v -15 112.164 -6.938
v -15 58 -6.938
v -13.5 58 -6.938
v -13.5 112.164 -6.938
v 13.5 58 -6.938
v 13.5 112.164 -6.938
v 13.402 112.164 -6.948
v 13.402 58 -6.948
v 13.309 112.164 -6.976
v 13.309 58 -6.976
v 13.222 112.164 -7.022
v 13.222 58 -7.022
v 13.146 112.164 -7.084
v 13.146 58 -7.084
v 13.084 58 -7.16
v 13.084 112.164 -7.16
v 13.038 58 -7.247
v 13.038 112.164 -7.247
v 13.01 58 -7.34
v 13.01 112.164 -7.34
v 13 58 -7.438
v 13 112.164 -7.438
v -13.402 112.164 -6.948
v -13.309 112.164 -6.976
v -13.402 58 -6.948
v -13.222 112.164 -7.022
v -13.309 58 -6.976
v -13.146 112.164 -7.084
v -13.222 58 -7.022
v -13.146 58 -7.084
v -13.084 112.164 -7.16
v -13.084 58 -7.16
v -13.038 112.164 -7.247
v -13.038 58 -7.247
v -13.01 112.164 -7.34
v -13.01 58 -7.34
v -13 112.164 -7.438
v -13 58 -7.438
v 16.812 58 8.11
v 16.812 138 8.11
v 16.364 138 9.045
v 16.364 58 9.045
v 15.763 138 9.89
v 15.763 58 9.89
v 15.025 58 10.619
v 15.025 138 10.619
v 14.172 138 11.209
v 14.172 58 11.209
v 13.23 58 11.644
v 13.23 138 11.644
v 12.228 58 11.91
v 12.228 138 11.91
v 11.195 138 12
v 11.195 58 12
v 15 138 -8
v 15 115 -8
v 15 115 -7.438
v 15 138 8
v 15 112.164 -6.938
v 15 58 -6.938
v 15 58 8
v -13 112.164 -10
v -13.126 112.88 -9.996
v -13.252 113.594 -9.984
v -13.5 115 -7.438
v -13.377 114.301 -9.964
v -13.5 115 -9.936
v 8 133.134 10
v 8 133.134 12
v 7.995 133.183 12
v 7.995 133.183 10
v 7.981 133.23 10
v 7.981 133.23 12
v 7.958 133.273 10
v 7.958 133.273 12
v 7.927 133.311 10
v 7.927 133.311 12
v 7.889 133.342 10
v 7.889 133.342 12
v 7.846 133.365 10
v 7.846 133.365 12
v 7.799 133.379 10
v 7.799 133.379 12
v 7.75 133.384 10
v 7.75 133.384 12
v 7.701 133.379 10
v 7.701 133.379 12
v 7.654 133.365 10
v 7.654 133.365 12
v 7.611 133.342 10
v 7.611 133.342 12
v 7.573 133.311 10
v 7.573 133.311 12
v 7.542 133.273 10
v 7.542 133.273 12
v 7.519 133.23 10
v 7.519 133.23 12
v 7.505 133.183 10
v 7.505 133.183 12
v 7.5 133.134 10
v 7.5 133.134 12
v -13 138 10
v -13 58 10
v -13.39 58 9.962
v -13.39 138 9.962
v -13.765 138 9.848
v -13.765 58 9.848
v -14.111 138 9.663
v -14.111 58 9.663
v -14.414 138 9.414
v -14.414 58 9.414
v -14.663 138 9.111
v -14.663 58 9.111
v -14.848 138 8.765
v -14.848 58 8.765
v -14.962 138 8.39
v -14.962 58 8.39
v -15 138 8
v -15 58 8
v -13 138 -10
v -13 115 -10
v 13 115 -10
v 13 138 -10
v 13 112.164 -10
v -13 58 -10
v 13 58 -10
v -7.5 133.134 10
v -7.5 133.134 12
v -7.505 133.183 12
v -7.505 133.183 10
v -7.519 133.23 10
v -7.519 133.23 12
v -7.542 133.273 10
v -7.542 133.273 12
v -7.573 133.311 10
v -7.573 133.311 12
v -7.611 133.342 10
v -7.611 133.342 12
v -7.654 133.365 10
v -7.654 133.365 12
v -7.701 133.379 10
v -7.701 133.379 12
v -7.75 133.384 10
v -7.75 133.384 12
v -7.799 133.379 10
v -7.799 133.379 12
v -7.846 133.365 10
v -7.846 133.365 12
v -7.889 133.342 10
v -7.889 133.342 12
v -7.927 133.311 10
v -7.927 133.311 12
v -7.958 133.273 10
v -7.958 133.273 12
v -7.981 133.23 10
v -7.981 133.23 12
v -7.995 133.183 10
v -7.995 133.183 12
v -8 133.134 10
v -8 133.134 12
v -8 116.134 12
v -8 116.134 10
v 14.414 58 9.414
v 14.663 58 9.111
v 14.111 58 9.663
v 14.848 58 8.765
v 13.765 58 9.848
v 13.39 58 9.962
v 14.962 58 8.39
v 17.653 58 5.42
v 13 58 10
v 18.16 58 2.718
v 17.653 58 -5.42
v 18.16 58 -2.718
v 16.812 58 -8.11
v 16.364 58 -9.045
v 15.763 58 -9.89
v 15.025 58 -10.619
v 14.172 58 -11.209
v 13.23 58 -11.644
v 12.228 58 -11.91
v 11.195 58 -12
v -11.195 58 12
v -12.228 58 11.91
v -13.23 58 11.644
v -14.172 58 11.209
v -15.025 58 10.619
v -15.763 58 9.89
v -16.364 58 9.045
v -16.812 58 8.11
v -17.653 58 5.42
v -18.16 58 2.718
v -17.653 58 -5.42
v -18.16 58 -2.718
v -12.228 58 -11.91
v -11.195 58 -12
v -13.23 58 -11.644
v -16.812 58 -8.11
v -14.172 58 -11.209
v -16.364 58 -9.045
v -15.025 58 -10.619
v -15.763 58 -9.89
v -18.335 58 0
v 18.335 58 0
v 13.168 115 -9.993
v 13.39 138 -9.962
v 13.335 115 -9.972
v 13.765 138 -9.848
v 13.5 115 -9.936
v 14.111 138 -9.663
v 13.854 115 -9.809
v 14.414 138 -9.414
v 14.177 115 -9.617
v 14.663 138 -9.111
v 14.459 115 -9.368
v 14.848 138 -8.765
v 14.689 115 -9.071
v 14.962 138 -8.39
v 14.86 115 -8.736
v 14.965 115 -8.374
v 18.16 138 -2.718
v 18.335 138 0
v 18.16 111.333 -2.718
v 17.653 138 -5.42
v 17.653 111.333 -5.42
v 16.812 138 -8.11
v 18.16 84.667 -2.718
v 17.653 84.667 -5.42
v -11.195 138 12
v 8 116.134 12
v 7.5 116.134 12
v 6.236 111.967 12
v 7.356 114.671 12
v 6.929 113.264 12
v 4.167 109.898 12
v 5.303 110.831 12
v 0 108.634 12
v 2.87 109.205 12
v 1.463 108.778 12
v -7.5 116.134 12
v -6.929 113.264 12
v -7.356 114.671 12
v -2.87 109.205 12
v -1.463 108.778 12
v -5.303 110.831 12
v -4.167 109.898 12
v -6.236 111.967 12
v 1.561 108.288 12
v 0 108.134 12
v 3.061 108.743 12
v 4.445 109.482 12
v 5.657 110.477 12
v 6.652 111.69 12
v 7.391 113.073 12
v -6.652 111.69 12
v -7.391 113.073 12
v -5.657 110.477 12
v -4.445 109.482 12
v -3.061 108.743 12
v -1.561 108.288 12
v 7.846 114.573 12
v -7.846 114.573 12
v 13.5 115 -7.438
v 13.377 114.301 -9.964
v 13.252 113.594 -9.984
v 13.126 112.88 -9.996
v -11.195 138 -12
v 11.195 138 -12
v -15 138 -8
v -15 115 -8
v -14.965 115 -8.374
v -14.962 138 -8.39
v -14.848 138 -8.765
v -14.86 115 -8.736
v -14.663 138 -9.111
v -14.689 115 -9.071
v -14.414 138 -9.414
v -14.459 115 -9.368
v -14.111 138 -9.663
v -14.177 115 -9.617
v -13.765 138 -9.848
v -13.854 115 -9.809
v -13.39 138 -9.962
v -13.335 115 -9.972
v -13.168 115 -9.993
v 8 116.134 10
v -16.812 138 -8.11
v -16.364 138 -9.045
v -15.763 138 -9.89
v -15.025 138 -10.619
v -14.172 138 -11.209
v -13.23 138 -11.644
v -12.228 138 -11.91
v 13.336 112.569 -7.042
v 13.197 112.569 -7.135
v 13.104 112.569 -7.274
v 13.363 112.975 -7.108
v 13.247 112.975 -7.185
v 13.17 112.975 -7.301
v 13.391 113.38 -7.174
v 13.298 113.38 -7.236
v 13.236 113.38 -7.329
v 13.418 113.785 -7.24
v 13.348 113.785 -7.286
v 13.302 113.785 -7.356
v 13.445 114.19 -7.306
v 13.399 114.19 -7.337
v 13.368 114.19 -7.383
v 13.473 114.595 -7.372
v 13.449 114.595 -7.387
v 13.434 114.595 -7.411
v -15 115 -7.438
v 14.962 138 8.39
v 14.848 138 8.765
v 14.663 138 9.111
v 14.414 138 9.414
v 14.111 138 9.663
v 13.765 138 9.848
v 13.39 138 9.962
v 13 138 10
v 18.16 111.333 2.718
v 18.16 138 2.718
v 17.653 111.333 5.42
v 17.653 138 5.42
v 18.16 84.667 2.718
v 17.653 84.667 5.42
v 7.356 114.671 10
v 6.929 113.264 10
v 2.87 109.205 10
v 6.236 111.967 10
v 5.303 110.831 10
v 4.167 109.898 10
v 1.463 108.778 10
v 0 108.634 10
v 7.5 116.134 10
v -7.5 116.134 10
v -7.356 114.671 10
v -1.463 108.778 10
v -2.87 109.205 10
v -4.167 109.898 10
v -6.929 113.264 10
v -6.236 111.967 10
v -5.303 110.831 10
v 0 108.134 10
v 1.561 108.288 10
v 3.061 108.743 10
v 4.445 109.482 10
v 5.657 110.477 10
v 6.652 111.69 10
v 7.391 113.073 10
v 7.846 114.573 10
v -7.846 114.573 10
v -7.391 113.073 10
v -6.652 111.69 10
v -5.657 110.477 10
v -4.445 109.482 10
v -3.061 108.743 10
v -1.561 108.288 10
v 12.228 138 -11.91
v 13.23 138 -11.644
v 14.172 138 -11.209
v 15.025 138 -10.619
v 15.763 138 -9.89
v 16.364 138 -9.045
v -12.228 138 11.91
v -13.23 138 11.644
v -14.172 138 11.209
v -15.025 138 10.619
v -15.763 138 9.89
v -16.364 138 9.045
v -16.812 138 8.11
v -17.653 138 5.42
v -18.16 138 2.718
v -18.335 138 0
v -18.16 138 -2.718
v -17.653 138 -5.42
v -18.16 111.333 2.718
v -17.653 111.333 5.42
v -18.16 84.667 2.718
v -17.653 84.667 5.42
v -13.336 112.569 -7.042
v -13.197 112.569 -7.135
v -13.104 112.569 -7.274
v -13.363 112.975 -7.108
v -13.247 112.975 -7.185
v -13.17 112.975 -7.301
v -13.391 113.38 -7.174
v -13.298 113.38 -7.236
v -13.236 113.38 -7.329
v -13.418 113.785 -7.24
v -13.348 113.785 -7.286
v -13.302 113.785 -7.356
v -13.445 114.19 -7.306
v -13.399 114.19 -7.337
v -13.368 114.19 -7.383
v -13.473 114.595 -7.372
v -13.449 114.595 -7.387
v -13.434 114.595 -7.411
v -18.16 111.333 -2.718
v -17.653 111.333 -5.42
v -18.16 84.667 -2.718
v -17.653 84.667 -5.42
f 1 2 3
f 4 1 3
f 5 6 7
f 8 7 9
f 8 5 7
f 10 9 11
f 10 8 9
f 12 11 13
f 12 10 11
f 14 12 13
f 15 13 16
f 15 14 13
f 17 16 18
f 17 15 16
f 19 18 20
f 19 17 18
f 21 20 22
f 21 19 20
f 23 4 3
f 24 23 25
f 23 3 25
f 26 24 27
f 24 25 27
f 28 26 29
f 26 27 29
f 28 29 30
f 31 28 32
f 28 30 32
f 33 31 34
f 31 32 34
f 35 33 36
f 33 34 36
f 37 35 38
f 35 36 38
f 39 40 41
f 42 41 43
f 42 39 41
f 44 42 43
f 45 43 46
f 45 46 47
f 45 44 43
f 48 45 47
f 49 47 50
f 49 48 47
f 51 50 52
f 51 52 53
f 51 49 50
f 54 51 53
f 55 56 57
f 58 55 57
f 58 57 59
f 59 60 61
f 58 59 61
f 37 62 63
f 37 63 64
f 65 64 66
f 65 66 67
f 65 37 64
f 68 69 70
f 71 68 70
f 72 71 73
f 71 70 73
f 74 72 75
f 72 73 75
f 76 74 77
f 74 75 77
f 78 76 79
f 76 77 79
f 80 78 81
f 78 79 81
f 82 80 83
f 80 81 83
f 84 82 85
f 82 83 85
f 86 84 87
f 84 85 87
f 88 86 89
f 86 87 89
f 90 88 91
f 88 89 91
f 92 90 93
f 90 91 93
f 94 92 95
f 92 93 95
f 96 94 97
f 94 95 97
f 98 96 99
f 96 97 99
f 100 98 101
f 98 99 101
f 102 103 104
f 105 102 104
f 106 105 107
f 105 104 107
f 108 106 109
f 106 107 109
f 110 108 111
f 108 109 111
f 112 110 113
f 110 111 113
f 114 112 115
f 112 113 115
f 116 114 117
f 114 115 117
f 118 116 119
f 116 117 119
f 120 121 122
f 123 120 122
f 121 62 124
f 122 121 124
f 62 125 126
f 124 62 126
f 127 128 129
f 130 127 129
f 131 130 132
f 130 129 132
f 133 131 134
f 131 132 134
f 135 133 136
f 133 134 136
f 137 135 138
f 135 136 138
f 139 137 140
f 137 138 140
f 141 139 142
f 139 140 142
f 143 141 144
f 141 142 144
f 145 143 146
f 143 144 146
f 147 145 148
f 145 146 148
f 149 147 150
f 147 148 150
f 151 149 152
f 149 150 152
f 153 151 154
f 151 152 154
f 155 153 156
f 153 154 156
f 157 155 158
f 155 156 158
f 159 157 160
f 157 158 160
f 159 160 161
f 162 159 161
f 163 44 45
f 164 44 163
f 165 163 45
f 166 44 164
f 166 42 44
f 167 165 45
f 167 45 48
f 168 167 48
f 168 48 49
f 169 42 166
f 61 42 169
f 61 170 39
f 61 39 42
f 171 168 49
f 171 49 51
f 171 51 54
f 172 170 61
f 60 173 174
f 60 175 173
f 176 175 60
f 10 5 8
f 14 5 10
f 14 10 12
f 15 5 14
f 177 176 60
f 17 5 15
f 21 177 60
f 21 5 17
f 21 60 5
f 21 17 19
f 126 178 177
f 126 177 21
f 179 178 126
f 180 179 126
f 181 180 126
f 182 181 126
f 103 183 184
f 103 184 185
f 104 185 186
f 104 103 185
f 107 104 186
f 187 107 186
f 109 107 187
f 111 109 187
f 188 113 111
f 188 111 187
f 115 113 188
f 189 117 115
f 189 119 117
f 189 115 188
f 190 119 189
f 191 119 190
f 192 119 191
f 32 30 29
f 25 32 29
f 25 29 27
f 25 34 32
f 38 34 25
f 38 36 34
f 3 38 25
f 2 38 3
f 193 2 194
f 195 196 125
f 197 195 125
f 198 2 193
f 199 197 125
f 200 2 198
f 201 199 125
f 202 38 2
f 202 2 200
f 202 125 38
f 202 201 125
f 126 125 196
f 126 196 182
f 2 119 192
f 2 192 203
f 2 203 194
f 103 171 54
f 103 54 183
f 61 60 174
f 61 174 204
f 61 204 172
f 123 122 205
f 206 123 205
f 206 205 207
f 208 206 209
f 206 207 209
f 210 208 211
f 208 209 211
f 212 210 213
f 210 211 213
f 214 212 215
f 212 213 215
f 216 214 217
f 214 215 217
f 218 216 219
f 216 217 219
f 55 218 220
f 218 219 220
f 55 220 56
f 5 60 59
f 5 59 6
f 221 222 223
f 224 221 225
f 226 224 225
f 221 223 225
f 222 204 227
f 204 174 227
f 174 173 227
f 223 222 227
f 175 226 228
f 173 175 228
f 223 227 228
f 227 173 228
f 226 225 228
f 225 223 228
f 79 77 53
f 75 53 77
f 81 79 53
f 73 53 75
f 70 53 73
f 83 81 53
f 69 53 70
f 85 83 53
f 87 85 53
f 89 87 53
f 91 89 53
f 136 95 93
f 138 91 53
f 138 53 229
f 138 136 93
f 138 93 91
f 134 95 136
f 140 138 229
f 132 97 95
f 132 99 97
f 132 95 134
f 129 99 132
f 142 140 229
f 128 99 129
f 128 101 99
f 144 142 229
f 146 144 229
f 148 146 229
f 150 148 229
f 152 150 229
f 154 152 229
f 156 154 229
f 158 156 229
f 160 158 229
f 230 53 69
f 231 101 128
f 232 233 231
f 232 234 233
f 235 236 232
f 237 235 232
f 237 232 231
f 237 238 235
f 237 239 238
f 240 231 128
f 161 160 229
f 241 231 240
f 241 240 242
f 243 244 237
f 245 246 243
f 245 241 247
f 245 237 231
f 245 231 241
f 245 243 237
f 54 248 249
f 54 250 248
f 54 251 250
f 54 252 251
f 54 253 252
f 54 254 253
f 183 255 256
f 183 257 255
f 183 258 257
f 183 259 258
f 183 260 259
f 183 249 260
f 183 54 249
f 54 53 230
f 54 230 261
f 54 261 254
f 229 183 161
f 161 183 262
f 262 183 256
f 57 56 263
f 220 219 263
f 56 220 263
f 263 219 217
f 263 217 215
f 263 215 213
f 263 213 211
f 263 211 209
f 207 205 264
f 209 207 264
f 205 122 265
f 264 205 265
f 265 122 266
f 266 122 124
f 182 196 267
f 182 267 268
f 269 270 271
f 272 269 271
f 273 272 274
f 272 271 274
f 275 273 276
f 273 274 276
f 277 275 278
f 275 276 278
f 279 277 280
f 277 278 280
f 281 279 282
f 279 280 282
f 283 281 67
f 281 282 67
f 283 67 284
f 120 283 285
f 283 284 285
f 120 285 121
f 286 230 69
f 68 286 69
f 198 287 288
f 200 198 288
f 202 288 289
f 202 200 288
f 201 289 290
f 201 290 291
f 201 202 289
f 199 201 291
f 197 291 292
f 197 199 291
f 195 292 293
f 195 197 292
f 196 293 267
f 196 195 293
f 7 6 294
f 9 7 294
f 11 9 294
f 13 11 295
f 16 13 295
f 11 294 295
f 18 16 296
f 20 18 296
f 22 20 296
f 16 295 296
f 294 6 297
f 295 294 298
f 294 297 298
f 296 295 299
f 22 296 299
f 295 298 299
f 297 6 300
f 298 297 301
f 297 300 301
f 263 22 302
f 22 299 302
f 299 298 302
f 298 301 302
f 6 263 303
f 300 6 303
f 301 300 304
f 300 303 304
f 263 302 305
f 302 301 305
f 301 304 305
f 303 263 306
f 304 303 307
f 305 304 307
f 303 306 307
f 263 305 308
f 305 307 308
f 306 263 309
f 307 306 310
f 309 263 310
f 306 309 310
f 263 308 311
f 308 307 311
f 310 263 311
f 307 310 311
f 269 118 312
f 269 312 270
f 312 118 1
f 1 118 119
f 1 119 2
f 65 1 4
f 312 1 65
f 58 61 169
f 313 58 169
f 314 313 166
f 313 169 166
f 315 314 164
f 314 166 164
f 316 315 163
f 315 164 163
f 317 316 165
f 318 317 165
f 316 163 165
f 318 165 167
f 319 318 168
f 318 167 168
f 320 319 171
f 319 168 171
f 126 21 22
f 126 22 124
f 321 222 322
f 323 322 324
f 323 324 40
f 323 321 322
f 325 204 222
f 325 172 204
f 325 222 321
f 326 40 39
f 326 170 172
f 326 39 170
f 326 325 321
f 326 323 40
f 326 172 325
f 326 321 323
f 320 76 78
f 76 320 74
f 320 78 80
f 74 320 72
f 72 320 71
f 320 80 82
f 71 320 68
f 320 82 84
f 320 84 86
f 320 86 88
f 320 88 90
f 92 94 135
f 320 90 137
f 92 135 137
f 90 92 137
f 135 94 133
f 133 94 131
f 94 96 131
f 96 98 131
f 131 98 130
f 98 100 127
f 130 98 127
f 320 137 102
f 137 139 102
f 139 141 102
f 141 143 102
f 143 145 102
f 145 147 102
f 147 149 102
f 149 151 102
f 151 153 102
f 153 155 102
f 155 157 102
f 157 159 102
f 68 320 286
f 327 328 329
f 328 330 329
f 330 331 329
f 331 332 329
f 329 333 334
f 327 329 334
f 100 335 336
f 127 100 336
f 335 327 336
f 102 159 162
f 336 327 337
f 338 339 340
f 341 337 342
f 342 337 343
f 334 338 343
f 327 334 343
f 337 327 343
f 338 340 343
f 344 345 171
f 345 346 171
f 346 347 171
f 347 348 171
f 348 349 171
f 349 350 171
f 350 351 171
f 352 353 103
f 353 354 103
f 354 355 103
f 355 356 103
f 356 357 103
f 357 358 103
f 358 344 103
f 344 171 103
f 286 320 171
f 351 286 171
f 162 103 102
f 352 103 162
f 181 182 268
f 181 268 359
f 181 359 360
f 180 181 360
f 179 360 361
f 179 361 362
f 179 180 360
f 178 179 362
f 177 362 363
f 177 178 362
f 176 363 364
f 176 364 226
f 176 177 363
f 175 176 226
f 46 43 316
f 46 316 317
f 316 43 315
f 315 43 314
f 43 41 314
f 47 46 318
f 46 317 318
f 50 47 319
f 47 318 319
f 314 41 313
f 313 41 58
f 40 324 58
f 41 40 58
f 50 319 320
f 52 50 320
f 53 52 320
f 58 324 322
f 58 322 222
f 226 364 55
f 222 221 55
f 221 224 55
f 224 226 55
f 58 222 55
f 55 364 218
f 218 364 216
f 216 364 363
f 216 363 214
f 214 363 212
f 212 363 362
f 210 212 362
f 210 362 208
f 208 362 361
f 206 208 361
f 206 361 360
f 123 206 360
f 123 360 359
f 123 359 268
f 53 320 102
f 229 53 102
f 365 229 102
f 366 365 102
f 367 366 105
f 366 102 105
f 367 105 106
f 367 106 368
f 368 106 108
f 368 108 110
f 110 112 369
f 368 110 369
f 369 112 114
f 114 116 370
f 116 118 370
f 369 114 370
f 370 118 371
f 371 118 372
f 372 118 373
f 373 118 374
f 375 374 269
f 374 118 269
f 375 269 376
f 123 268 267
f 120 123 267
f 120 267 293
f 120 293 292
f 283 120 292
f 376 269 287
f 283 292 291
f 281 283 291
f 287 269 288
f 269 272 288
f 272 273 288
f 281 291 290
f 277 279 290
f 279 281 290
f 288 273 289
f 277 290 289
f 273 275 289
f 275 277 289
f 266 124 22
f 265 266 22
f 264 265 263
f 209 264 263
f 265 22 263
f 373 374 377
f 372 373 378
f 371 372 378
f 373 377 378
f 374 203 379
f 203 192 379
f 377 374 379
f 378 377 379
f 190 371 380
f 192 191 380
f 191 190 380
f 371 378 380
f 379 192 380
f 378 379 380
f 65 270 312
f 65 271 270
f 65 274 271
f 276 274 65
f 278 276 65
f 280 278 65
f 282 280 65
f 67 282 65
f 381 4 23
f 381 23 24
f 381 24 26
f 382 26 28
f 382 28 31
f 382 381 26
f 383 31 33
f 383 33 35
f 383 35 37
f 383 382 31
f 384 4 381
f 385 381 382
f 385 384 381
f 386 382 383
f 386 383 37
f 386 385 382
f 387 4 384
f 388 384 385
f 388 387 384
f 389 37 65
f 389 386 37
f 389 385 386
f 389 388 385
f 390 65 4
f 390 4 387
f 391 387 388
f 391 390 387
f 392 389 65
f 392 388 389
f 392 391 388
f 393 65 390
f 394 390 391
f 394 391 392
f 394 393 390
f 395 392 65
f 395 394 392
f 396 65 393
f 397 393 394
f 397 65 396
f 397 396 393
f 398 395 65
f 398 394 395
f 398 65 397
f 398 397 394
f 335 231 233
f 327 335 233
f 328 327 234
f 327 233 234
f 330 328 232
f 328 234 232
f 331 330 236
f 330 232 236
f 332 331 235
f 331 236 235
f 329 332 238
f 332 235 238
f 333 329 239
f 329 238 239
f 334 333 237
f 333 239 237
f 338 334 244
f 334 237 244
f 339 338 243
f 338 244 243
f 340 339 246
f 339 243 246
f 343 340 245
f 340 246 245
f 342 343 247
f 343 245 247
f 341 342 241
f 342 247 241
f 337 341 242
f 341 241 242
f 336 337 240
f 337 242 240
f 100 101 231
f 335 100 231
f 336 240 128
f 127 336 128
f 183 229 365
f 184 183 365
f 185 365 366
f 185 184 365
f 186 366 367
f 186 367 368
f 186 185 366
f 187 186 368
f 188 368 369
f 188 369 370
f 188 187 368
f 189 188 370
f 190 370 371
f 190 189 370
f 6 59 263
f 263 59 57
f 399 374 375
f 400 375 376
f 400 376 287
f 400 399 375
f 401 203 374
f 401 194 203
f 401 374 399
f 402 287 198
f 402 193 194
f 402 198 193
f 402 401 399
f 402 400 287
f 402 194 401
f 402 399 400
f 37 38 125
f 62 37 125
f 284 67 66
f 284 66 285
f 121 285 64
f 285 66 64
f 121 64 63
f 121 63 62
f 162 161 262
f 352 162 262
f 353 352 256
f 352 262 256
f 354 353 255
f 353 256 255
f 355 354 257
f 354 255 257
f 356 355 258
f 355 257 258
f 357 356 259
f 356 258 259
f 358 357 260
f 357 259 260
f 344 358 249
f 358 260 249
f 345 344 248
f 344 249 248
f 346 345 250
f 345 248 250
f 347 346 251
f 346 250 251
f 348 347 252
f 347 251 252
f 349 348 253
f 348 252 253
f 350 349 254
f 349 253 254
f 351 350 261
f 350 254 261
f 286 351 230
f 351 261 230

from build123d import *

# Parameters (mm, degrees)
BOSS_EXTRUDE4_DEPTH = 80
BOSS_EXTRUDE5_DEPTH = 57
CUT_EXTRUDE1_DEPTH  = 2
CHAMFER1_SIZE       = 2.83564091
CHAMFER1_SIZE_2     = 0.5


with BuildPart() as part:
    # Sketch8 → Boss-Extrude4 (new body)
    with BuildSketch(Plane(origin=(0, 58, 0), x_dir=(1, 0, 0), z_dir=(0, 1, 0))):
        with BuildLine():
            Line((-11.194828593, 12.000000011), (11.194828559, 12.000000011))
            ThreePointArc((11.194828559, 12.000000011), (14.611088941, 10.932460351), (16.811684841, 8.109721678))
            add(Edge.make_bspline(
                [(18.334712564, 1.1e-08), (18.327162677, 2.726130673), (17.819510816, 5.426517656), (16.811684841, 8.109721678)],
                knots=[0.502499344, 0.502499344, 0.502499344, 0.502499344, 0.837905074, 0.837905074, 0.837905074, 0.837905074], degree=3))
            add(Edge.make_bspline(
                [(18.334712564, 1.1e-08), (18.327162677, -2.72613065), (17.819510816, -5.426517634), (16.811684841, -8.109721656)],
                knots=[0.502499344, 0.502499344, 0.502499344, 0.502499344, 0.837905074, 0.837905074, 0.837905074, 0.837905074], degree=3))
            ThreePointArc((16.811684841, -8.109721656), (14.611088941, -10.932460328), (11.194828559, -11.999999989))
            Line((11.194828559, -11.999999989), (-11.194828593, -11.999999989))
            ThreePointArc((-11.194828593, -11.999999989), (-14.611088975, -10.932460328), (-16.811684874, -8.109721656))
            add(Edge.make_bspline(
                [(-18.334712598, 1.1e-08), (-18.327162711, -2.72613065), (-17.81951085, -5.426517634), (-16.811684874, -8.109721656)],
                knots=[0.502499344, 0.502499344, 0.502499344, 0.502499344, 0.837905074, 0.837905074, 0.837905074, 0.837905074], degree=3))
            add(Edge.make_bspline(
                [(-18.334712598, 1.1e-08), (-18.327162711, 2.726130673), (-17.81951085, 5.426517656), (-16.811684874, 8.109721678)],
                knots=[0.502499344, 0.502499344, 0.502499344, 0.502499344, 0.837905074, 0.837905074, 0.837905074, 0.837905074], degree=3))
            ThreePointArc((-16.811684874, 8.109721678), (-14.611088975, 10.932460351), (-11.194828593, 12.000000011))
        make_face()
        with BuildLine():
            Line((-15.000000017, -7.999999989), (-15.000000017, 8.000000011))
            ThreePointArc((-15.000000017, 8.000000011), (-14.414213579, 9.414213574), (-13.000000017, 10.000000011))
            Line((-13.000000017, 10.000000011), (12.999999983, 10.000000011))
            ThreePointArc((12.999999983, 10.000000011), (14.414213546, 9.414213574), (14.999999983, 8.000000011))
            Line((14.999999983, 8.000000011), (14.999999983, -7.999999989))
            ThreePointArc((14.999999983, -7.999999989), (14.414213546, -9.414213551), (12.999999983, -9.999999989))
            Line((12.999999983, -9.999999989), (-13.000000017, -9.999999989))
            ThreePointArc((-13.000000017, -9.999999989), (-14.414213579, -9.414213551), (-15.000000017, -7.999999989))
        make_face(mode=Mode.SUBTRACT)
    extrude(amount=BOSS_EXTRUDE4_DEPTH)

    # Sketch11 → Boss-Extrude5 (add)
    with BuildSketch(Plane(origin=(0, 58, 0), x_dir=(1, 0, 0), z_dir=(0, 1, 0))):
        with BuildLine():
            Line((13, 10.000000011), (15, 10.000000011))
            Line((15, 10.000000011), (15, 6.937911183))
            Line((15, 6.937911183), (13.5, 6.937911183))
            ThreePointArc((13.5, 6.937911183), (13.146446609, 7.084357793), (13, 7.437911183))
            Line((13, 7.437911183), (13, 10.000000011))
        make_face()
        with BuildLine():
            Line((-13, 7.437911183), (-13, 10.000000011))
            Line((-13, 10.000000011), (-15, 10.000000011))
            Line((-15, 10.000000011), (-15, 6.937911183))
            Line((-15, 6.937911183), (-13.5, 6.937911183))
            ThreePointArc((-13.5, 6.937911183), (-13.146446609, 7.084357793), (-13, 7.437911183))
        make_face()
    extrude(amount=BOSS_EXTRUDE5_DEPTH)

    # Sketch12 → Cut-Extrude1 (cut)
    with BuildSketch(Plane.XY.offset(11.999999989)):
        with BuildLine():
            Line((7.5, 133.134156445), (7.5, 116.134156445))
            ThreePointArc((7.5, 116.134156445), (0, 108.634156445), (-7.5, 116.134156445))
            Line((-7.5, 116.134156445), (-7.5, 133.134156445))
            ThreePointArc((-7.5, 133.134156445), (-7.75, 133.384156445), (-8, 133.134156445))
            Line((-8, 133.134156445), (-8, 116.134156445))
            ThreePointArc((-8, 116.134156445), (0, 108.134156445), (8, 116.134156445))
            Line((8, 116.134156445), (8, 133.134156445))
            ThreePointArc((8, 133.134156445), (7.75, 133.384156445), (7.5, 133.134156445))
        make_face()
    extrude(amount=-CUT_EXTRUDE1_DEPTH, mode=Mode.SUBTRACT)

    # Chamfer1
    # the kernel refuses this chamfer: 2.83564091, 0.5 mm, written as the material it takes off along each edge
    with BuildSketch(Plane(origin=(13, 115, -7.437911183), x_dir=(0, -1, 0), z_dir=(0, 0, -1))) as chamfer1_piece_1_section:
        Polygon((CHAMFER1_SIZE, 0), (0, -CHAMFER1_SIZE_2), (0, 0), align=None)
    chamfer1_piece_1 = extrude(amount=9.930611745, mode=Mode.PRIVATE)
    chamfer1_piece_1 = chamfer1_piece_1 & Plane(origin=(12.999999983, 115, -8.000000011), x_dir=(0, 0, -1), z_dir=(0, -1, 0)) * Cylinder(2, 32, mode=Mode.PRIVATE)
    add(chamfer1_piece_1, mode=Mode.SUBTRACT)
    with BuildSketch(Plane(origin=(13.5, 115, -7.437911183), x_dir=(0, 0, 1), z_dir=(1, 0, 0))) as chamfer1_piece_2:
        Polygon((0.5, CHAMFER1_SIZE), (0.5 - CHAMFER1_SIZE_2, 0), (0.5, 0), align=None)
    revolve(axis=Axis((13.5, 115, -7.437911183), (0, -1, 0)), revolution_arc=90, mode=Mode.SUBTRACT)
    with BuildSketch(Plane(origin=(15, 115, -6.937911183), x_dir=(0, -1, 0), z_dir=(-1, 0, 0))) as chamfer1_piece_3:
        Polygon((CHAMFER1_SIZE, 0), (0, -CHAMFER1_SIZE_2), (0, 0), align=None)
    extrude(amount=1.5, mode=Mode.SUBTRACT)
    with BuildSketch(Plane(origin=(-13, 115, -7.437911183), x_dir=(0, -1, 0), z_dir=(0, 0, -1))) as chamfer1_piece_4_section:
        Polygon((CHAMFER1_SIZE, 0), (0, CHAMFER1_SIZE_2), (0, 0), align=None)
    chamfer1_piece_4 = extrude(amount=9.930611745, mode=Mode.PRIVATE)
    chamfer1_piece_4 = chamfer1_piece_4 & Plane(origin=(-13.000000017, 115, -8.000000011), x_dir=(-1, 0, 0), z_dir=(0, -1, 0)) * Cylinder(2, 32, mode=Mode.PRIVATE)
    add(chamfer1_piece_4, mode=Mode.SUBTRACT)
    with BuildSketch(Plane(origin=(-15, 115, -6.937911183), x_dir=(0, -1, 0), z_dir=(1, 0, 0))) as chamfer1_piece_5:
        Polygon((CHAMFER1_SIZE, 0), (0, CHAMFER1_SIZE_2), (0, 0), align=None)
    extrude(amount=1.5, mode=Mode.SUBTRACT)
    with BuildSketch(Plane(origin=(-13.5, 115, -7.437911183), x_dir=(0, 0, 1), z_dir=(-1, 0, 0))) as chamfer1_piece_6:
        Polygon((0.5, -CHAMFER1_SIZE), (0.5 - CHAMFER1_SIZE_2, 0), (0.5, 0), align=None)
    revolve(axis=Axis((-13.5, 115, -7.437911183), (0, 1, 0)), revolution_arc=90, mode=Mode.SUBTRACT)


solid = part.part
